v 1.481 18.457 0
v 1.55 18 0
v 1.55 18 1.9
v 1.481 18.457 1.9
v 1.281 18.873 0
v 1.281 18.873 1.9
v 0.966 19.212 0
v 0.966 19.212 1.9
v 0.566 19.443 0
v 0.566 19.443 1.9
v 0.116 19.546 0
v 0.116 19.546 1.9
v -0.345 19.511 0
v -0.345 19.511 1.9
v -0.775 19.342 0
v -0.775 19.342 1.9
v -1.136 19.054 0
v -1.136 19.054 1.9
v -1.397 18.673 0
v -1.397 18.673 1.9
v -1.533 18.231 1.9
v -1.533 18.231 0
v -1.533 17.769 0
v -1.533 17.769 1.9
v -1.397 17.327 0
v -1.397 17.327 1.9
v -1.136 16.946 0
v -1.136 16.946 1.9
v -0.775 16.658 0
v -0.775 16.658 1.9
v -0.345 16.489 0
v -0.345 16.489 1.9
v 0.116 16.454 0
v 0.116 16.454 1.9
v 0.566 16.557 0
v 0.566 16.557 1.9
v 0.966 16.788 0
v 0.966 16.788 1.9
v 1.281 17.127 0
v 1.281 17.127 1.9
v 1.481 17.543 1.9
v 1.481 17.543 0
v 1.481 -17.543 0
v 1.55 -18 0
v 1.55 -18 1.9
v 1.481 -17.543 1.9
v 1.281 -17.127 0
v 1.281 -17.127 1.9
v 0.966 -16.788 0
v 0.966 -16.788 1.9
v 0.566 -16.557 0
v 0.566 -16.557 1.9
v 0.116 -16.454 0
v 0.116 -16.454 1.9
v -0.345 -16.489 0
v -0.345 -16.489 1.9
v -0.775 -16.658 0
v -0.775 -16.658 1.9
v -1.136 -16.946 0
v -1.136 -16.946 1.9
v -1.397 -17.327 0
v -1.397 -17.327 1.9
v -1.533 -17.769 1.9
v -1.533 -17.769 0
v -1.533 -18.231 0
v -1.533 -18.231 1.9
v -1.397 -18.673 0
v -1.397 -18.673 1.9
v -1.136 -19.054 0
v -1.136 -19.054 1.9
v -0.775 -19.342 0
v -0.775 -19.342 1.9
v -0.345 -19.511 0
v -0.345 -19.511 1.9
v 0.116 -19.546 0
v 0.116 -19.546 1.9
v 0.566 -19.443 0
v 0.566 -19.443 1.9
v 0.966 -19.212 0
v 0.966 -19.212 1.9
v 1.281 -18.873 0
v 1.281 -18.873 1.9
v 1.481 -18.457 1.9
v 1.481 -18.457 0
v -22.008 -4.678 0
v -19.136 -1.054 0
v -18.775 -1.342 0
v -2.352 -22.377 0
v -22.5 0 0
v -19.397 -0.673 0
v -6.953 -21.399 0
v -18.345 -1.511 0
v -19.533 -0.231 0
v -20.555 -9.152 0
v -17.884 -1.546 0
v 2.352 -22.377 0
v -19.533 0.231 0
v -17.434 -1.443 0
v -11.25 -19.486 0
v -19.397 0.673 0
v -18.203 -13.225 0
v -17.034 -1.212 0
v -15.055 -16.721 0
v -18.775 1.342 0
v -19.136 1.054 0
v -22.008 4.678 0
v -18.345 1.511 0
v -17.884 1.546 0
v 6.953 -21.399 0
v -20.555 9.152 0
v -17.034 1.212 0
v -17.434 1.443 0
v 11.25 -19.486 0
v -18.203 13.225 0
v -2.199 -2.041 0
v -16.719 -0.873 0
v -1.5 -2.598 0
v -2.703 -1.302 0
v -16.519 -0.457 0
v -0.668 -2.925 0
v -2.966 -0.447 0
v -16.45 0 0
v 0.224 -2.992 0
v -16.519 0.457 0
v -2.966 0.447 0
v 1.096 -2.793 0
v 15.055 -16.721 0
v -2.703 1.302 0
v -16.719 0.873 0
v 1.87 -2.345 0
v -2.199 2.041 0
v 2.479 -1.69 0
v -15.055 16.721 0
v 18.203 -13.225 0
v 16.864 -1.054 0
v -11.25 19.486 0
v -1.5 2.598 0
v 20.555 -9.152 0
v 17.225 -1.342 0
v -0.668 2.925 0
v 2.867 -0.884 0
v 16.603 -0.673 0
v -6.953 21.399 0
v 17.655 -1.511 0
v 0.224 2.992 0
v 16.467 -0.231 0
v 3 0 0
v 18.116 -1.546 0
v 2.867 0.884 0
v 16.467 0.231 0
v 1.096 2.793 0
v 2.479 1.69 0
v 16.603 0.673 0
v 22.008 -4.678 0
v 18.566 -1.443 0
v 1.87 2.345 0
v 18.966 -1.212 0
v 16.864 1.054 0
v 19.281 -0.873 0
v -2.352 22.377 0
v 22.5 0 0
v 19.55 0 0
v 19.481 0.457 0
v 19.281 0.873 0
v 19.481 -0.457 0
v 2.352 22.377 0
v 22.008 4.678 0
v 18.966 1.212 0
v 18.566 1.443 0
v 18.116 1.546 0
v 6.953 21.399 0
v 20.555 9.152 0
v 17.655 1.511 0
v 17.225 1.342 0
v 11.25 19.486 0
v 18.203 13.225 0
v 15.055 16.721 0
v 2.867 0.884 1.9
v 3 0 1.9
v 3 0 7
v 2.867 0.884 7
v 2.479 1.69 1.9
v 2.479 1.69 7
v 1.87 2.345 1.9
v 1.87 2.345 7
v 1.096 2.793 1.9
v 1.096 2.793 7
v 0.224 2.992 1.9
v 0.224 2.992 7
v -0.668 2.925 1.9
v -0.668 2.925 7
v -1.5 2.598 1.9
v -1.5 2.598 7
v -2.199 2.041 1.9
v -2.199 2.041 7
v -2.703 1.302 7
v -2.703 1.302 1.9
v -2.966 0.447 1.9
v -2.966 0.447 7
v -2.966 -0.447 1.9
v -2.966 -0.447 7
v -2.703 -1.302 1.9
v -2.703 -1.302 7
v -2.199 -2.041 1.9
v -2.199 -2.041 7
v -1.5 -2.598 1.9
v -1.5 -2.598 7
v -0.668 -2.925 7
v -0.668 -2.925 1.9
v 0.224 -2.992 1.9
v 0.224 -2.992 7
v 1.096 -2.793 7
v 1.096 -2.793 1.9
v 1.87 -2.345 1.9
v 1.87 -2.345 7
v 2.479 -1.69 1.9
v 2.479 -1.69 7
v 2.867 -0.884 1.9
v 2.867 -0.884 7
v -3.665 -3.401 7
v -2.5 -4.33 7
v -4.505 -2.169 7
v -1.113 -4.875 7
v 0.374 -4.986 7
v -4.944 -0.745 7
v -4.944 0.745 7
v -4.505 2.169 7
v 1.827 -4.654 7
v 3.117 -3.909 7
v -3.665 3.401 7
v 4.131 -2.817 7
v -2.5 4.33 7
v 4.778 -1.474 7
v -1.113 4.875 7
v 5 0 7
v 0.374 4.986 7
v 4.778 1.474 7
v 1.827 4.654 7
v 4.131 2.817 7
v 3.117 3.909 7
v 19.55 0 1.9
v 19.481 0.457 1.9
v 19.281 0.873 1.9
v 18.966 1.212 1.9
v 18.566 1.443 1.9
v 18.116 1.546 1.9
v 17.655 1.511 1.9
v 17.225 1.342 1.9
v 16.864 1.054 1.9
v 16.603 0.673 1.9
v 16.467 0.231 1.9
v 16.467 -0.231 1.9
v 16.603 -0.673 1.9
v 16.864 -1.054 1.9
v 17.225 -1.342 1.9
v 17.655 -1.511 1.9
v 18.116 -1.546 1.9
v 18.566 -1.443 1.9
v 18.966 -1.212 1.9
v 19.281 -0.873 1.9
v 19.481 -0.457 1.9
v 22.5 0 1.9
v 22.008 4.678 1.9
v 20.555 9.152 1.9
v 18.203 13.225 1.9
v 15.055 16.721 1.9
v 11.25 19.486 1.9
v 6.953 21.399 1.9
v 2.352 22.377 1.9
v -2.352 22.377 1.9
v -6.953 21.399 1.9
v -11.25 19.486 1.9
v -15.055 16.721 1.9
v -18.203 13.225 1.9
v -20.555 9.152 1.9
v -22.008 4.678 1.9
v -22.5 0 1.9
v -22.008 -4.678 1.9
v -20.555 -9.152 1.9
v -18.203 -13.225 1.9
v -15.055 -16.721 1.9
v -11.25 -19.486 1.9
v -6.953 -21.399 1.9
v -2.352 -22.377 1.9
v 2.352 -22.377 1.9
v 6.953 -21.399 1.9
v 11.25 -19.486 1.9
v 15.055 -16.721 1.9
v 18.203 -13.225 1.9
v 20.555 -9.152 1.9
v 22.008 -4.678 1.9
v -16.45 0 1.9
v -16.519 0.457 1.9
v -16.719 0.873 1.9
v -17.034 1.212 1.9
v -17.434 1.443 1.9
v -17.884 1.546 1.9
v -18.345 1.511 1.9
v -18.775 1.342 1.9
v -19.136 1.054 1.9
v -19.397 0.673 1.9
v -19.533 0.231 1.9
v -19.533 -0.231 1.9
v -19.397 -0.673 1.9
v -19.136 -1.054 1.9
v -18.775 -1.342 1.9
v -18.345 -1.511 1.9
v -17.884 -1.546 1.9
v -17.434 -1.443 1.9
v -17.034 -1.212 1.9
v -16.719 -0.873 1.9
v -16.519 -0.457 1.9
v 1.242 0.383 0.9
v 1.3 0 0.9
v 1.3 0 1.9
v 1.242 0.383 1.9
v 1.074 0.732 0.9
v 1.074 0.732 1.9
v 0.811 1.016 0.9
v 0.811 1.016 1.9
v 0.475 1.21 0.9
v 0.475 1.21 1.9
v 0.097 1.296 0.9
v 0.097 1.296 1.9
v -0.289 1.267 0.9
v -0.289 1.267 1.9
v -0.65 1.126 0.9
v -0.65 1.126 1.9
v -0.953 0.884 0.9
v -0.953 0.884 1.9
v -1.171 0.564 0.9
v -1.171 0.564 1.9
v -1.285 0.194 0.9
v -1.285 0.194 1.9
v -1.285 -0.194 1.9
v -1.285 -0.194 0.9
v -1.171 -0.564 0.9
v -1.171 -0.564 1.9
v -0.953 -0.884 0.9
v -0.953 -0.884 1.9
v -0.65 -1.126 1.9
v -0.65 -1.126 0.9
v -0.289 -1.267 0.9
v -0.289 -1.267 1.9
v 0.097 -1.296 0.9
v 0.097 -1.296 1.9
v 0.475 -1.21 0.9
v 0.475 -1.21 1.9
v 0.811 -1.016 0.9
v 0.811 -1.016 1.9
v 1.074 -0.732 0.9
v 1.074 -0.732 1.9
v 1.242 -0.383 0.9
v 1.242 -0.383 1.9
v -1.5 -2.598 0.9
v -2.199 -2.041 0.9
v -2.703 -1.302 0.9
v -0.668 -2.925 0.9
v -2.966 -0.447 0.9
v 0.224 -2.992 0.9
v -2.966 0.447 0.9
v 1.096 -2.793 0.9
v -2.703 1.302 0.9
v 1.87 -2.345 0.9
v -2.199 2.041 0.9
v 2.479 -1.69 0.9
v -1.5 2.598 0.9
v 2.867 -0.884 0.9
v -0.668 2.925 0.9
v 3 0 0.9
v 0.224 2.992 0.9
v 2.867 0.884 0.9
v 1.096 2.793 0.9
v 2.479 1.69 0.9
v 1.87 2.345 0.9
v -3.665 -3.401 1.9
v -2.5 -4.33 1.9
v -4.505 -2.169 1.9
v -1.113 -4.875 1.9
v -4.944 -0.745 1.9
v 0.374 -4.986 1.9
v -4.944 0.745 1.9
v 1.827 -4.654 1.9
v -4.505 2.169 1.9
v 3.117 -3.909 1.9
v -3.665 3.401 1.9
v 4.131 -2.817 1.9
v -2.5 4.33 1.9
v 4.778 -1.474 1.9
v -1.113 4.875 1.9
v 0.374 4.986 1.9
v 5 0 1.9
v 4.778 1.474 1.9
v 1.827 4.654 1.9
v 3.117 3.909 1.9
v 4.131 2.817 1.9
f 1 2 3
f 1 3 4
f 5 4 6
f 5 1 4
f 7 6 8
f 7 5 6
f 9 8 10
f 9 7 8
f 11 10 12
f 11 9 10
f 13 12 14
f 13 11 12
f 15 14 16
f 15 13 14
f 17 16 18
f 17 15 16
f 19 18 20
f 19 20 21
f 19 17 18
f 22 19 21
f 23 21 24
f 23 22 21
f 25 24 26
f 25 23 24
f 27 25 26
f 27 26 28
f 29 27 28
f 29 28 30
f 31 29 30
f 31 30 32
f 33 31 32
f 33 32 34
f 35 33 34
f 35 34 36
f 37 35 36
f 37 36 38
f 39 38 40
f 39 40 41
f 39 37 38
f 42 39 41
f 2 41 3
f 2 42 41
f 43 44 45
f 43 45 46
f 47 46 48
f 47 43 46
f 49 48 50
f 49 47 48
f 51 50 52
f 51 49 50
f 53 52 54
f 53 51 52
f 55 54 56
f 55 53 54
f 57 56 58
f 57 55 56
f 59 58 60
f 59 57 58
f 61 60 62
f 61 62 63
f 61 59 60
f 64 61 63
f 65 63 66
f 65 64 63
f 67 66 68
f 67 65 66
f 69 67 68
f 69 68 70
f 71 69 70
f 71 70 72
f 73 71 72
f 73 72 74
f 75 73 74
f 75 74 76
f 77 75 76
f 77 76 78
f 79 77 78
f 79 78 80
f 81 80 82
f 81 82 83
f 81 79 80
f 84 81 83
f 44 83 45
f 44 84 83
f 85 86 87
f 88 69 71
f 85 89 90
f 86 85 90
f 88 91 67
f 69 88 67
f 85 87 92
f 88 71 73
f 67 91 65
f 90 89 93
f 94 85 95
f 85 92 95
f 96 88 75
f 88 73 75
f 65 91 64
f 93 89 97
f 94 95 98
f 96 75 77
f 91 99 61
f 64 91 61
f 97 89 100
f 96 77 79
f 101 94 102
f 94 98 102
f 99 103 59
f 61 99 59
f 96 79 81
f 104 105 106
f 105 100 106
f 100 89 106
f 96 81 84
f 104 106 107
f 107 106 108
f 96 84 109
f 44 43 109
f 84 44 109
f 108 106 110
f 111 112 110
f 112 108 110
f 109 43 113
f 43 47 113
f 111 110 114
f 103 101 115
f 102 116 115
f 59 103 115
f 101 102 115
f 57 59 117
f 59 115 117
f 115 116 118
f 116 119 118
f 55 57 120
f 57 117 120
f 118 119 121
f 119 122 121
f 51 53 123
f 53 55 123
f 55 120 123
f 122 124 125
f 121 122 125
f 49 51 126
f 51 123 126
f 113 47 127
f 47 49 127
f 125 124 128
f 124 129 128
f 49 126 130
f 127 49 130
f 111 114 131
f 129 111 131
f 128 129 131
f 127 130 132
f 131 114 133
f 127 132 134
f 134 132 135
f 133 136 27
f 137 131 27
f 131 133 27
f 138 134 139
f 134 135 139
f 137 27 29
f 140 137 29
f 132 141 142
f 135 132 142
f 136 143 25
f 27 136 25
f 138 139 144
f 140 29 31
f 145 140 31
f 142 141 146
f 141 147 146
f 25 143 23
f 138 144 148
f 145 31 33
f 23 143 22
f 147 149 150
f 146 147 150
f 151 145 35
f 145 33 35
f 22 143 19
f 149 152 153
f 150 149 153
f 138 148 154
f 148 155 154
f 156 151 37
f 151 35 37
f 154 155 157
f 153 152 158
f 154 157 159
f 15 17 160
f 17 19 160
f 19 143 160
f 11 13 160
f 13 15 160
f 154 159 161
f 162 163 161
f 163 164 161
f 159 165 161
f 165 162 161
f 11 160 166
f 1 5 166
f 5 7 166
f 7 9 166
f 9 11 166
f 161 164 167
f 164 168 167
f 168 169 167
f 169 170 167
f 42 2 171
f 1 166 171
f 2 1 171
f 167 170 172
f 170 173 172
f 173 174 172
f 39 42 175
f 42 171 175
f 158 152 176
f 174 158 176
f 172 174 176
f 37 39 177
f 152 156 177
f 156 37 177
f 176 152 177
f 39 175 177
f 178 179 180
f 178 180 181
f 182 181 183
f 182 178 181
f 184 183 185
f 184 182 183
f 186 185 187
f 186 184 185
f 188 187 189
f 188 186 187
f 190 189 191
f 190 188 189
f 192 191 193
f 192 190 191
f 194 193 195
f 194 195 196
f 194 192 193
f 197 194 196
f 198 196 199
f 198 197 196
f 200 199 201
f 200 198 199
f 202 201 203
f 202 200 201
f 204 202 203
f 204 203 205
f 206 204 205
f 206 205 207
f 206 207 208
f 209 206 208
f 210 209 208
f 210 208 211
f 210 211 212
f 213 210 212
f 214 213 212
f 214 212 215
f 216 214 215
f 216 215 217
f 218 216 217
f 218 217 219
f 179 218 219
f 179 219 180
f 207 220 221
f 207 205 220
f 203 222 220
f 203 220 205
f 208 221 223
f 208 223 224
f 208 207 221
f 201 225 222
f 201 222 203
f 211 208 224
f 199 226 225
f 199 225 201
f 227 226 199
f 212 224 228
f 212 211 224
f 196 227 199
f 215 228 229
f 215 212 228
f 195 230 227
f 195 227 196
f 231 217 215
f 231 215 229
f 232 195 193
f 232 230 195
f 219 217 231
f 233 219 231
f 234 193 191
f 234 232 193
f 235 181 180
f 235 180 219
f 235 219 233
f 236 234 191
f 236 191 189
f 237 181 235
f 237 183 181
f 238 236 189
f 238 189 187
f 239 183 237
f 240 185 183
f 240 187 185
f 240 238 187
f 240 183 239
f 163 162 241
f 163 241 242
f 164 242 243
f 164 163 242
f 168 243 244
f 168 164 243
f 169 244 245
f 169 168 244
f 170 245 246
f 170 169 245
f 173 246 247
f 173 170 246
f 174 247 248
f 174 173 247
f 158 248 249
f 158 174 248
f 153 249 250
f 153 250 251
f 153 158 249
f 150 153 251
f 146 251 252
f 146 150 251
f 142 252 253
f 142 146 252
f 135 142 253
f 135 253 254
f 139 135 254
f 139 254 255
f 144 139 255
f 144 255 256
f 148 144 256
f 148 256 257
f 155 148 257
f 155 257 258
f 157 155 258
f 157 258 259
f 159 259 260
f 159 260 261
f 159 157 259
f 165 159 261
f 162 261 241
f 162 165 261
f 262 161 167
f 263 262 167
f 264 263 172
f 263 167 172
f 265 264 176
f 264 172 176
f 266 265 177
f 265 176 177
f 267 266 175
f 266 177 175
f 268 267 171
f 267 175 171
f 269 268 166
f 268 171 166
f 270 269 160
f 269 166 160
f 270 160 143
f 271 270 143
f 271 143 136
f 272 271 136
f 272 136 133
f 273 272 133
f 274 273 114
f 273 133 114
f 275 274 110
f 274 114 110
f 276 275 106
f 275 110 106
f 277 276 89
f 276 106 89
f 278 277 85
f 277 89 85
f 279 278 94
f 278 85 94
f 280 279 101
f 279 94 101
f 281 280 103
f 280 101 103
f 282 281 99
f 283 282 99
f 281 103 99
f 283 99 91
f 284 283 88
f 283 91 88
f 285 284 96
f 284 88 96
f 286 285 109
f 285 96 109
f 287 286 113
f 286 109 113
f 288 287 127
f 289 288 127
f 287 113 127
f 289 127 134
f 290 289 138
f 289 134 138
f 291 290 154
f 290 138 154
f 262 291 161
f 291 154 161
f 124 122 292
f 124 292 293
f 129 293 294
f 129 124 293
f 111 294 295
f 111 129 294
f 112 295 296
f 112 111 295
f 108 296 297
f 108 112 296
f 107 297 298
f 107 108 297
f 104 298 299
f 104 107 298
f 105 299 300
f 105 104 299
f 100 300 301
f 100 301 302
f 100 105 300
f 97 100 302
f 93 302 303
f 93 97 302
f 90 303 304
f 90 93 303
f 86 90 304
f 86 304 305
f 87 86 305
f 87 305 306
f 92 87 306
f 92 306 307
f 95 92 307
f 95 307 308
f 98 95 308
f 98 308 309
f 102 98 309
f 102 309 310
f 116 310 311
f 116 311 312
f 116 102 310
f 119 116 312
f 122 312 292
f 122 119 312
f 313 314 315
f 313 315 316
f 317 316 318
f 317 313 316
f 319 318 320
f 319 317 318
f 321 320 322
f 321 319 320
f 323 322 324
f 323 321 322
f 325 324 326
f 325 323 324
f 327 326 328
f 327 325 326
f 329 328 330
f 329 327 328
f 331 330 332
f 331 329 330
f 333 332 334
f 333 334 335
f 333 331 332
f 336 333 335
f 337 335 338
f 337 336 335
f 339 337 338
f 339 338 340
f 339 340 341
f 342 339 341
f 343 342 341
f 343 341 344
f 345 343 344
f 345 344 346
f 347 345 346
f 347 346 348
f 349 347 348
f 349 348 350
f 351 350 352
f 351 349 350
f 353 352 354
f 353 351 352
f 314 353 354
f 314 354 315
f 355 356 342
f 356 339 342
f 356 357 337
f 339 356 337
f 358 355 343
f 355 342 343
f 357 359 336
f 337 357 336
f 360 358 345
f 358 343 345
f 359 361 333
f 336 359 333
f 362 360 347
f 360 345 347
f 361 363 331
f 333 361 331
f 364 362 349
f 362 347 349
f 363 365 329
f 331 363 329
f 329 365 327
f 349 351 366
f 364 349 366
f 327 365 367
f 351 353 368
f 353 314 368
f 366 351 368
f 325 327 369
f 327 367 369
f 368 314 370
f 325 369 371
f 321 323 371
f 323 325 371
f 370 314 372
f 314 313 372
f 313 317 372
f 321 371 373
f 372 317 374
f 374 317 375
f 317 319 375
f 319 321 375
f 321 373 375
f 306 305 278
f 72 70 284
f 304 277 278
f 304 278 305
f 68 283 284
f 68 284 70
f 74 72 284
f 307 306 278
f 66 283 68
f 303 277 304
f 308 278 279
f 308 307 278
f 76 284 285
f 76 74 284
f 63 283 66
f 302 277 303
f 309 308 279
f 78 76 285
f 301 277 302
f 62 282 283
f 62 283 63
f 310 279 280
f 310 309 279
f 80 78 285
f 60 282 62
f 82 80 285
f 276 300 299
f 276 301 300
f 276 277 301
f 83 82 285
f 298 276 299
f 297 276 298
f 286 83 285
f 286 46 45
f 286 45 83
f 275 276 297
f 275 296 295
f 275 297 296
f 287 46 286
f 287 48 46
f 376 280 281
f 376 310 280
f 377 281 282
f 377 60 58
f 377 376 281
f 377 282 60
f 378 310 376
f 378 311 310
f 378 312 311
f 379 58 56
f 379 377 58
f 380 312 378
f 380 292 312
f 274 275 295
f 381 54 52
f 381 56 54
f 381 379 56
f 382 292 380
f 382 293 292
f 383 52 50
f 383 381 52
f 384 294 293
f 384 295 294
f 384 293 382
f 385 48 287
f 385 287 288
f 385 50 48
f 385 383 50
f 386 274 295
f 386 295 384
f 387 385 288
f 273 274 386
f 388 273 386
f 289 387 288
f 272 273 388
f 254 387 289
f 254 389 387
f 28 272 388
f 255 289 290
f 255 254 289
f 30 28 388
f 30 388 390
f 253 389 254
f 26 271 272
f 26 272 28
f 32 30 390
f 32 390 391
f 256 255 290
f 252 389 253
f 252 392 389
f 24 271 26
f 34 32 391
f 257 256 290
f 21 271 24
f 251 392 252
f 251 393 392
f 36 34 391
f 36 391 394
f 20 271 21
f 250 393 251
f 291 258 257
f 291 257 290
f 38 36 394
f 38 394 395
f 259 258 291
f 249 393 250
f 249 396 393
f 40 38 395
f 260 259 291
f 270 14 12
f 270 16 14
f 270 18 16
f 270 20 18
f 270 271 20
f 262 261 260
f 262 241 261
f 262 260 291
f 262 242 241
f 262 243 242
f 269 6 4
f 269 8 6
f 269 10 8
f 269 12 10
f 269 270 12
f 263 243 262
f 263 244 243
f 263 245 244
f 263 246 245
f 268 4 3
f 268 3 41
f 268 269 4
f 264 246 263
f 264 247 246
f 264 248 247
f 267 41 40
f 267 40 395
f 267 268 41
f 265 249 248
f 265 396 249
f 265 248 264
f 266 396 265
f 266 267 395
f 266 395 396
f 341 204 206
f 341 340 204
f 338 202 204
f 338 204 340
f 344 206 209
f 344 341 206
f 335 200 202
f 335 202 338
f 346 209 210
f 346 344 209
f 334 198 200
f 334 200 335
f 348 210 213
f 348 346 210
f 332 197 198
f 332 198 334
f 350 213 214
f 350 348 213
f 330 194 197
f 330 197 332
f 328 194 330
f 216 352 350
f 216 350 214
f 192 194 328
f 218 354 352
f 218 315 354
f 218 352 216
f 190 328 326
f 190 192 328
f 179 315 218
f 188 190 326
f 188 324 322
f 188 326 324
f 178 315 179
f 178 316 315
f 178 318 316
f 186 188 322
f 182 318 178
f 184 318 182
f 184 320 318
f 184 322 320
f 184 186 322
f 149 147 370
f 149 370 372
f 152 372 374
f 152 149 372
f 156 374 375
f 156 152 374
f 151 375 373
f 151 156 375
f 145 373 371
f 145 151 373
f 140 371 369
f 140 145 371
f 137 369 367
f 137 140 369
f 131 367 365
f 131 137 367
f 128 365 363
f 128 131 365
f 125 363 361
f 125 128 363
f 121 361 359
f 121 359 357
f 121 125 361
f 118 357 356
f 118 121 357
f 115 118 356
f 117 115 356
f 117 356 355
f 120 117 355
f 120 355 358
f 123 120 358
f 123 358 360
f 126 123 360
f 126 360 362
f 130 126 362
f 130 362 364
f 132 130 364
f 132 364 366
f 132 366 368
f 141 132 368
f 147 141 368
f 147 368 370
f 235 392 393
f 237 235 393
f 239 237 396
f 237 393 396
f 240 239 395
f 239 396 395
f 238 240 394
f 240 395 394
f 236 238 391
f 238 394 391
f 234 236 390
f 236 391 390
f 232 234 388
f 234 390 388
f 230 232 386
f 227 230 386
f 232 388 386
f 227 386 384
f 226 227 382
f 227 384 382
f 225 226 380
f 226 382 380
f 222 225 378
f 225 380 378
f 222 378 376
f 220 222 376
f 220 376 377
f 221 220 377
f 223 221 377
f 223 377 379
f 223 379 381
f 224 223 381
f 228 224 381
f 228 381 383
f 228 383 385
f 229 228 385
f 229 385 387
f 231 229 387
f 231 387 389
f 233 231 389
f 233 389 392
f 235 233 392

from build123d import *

# Parameters (mm, degrees)
F0_R     = 22.5
F0_R_2   = 1.55
F0_R_3   = 5
F1_DEPTH = 1.9
F0_R_4   = 3
F2_DEPTH = 7
F3_START = 0.9
F0_R_5   = 1.3
F3_DEPTH = 1


with BuildPart() as f1:
    # F0 (on Top) → F1 (new body)
    with BuildSketch(Plane.XY):
        Circle(F0_R)
        with Locations((0, -18)):
            Circle(F0_R_2, mode=Mode.SUBTRACT)
        with Locations((-18, 0)):
            Circle(F0_R_2, mode=Mode.SUBTRACT)
        Circle(F0_R_3, mode=Mode.SUBTRACT)
        with Locations((18, 0)):
            Circle(F0_R_2, mode=Mode.SUBTRACT)
        with Locations((0, 18)):
            Circle(F0_R_2, mode=Mode.SUBTRACT)
    extrude(amount=F1_DEPTH)

    # F0 (on Top) → F2 (join)
    with BuildSketch(Plane.XY):
        Circle(F0_R_3)
        Circle(F0_R_4, mode=Mode.SUBTRACT)
    extrude(amount=F2_DEPTH)

    # F0 (on Top) → F3 (join)
    with BuildSketch(Plane.XY.offset(F3_START)):
        Circle(F0_R_4)
        Circle(F0_R_5, mode=Mode.SUBTRACT)
    extrude(amount=F3_DEPTH)


solid = f1.part
